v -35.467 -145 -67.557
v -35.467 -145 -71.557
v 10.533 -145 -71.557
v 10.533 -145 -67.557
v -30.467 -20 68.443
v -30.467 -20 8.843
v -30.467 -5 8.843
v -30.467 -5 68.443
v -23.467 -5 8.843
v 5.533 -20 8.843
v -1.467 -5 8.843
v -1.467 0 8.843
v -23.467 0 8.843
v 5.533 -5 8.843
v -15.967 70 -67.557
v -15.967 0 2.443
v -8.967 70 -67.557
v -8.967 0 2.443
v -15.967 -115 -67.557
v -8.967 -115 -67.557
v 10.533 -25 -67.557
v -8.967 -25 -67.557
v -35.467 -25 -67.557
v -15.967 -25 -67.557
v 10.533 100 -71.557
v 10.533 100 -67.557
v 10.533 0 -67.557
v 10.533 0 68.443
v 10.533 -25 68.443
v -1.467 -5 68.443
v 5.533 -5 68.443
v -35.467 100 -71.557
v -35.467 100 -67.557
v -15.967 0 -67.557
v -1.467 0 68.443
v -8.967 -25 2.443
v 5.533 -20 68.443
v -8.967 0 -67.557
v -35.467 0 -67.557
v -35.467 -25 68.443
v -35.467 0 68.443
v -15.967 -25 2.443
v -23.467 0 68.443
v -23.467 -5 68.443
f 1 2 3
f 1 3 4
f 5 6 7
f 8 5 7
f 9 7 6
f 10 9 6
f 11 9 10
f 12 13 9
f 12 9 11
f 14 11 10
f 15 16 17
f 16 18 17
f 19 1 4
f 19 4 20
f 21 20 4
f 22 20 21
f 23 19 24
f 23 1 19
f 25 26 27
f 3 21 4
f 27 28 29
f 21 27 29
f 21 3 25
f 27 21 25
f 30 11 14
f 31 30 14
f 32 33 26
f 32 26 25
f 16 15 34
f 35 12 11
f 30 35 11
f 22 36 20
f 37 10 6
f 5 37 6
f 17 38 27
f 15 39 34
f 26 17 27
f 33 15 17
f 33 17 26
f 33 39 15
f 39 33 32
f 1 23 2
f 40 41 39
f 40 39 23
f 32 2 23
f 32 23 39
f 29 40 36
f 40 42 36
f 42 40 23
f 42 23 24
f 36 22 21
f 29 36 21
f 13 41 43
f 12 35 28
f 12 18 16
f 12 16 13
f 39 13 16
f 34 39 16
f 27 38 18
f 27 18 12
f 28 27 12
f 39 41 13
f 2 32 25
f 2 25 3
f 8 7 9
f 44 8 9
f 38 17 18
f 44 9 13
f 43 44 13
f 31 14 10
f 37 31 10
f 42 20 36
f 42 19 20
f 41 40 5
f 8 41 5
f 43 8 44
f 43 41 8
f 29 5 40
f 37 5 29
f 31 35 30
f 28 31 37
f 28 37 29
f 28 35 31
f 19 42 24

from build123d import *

# Parameters (mm, degrees)
F0_W      = 46
F0_H      = 80
F1_DEPTH  = 25
F4_DEPTH  = 60
F5_DEPTH  = 46
F8_DEPTH  = 3.5
F10_DEPTH = 0.4


with BuildPart() as f1:
    # F0 (on Front) → F1 (new body)
    with BuildSketch(Plane.XZ):
        with Locations((-12.4670048244, -31.5567021806)):
            Rectangle(F0_W, F0_H)
    extrude(amount=F1_DEPTH)

    # F3 (on face) → F4 (join)
    with BuildSketch(Plane.XY.offset(8.4432978194)):
        Polygon((10.5329951756, -25), (10.5329951756, 0), (-1.4670048244, 0), (-1.4670048244, -5), (5.5329951756, -5), (5.5329951756, -20), (-30.4670048244, -20), (-30.4670048244, -5), (-23.4670048244, -5), (-23.4670048244, 0), (-35.4670048244, 0), (-35.4670048244, -25), align=None)
    extrude(amount=F4_DEPTH)

    # F2 (on face) → F5 (join)
    with BuildSketch(Plane(origin=(-35.4670048244, 0, 0), x_dir=(0, -1, 0), z_dir=(-1, 0, 0))):
        Polygon((-100, -71.5567021806), (0, -71.5567021806), (0, -67.5567021806), (-70, -67.5567021806), (-100, -67.5567021806), align=None)
        Polygon((25, -67.5567021806), (25, -71.5567021806), (145, -71.5567021806), (145, -67.5567021806), (115, -67.5567021806), align=None)
    extrude(amount=-F5_DEPTH)

    # F7 (on offset) → F8 (join, symmetric)
    with BuildSketch(Plane(origin=(-12.4670048244, 0, 0), x_dir=(0, -1, 0), z_dir=(-1, 0, 0))):
        Polygon((0, -67.5567021806), (0, 2.4432978194), (-70, -67.5567021806), align=None)
        Polygon((25, 2.4432978194), (25, -67.5567021806), (115, -67.5567021806), align=None)
    extrude(amount=F8_DEPTH, both=True)

    # F10 (add, through all): a face of the model
    f10_faces = [f1.faces().sort_by_distance(p)[0] for p in [
        (-12.4670048244, -10.8076923077, 8.4432978194),
    ]]
    extrude(f10_faces, amount=F10_DEPTH)


solid = f1.part
